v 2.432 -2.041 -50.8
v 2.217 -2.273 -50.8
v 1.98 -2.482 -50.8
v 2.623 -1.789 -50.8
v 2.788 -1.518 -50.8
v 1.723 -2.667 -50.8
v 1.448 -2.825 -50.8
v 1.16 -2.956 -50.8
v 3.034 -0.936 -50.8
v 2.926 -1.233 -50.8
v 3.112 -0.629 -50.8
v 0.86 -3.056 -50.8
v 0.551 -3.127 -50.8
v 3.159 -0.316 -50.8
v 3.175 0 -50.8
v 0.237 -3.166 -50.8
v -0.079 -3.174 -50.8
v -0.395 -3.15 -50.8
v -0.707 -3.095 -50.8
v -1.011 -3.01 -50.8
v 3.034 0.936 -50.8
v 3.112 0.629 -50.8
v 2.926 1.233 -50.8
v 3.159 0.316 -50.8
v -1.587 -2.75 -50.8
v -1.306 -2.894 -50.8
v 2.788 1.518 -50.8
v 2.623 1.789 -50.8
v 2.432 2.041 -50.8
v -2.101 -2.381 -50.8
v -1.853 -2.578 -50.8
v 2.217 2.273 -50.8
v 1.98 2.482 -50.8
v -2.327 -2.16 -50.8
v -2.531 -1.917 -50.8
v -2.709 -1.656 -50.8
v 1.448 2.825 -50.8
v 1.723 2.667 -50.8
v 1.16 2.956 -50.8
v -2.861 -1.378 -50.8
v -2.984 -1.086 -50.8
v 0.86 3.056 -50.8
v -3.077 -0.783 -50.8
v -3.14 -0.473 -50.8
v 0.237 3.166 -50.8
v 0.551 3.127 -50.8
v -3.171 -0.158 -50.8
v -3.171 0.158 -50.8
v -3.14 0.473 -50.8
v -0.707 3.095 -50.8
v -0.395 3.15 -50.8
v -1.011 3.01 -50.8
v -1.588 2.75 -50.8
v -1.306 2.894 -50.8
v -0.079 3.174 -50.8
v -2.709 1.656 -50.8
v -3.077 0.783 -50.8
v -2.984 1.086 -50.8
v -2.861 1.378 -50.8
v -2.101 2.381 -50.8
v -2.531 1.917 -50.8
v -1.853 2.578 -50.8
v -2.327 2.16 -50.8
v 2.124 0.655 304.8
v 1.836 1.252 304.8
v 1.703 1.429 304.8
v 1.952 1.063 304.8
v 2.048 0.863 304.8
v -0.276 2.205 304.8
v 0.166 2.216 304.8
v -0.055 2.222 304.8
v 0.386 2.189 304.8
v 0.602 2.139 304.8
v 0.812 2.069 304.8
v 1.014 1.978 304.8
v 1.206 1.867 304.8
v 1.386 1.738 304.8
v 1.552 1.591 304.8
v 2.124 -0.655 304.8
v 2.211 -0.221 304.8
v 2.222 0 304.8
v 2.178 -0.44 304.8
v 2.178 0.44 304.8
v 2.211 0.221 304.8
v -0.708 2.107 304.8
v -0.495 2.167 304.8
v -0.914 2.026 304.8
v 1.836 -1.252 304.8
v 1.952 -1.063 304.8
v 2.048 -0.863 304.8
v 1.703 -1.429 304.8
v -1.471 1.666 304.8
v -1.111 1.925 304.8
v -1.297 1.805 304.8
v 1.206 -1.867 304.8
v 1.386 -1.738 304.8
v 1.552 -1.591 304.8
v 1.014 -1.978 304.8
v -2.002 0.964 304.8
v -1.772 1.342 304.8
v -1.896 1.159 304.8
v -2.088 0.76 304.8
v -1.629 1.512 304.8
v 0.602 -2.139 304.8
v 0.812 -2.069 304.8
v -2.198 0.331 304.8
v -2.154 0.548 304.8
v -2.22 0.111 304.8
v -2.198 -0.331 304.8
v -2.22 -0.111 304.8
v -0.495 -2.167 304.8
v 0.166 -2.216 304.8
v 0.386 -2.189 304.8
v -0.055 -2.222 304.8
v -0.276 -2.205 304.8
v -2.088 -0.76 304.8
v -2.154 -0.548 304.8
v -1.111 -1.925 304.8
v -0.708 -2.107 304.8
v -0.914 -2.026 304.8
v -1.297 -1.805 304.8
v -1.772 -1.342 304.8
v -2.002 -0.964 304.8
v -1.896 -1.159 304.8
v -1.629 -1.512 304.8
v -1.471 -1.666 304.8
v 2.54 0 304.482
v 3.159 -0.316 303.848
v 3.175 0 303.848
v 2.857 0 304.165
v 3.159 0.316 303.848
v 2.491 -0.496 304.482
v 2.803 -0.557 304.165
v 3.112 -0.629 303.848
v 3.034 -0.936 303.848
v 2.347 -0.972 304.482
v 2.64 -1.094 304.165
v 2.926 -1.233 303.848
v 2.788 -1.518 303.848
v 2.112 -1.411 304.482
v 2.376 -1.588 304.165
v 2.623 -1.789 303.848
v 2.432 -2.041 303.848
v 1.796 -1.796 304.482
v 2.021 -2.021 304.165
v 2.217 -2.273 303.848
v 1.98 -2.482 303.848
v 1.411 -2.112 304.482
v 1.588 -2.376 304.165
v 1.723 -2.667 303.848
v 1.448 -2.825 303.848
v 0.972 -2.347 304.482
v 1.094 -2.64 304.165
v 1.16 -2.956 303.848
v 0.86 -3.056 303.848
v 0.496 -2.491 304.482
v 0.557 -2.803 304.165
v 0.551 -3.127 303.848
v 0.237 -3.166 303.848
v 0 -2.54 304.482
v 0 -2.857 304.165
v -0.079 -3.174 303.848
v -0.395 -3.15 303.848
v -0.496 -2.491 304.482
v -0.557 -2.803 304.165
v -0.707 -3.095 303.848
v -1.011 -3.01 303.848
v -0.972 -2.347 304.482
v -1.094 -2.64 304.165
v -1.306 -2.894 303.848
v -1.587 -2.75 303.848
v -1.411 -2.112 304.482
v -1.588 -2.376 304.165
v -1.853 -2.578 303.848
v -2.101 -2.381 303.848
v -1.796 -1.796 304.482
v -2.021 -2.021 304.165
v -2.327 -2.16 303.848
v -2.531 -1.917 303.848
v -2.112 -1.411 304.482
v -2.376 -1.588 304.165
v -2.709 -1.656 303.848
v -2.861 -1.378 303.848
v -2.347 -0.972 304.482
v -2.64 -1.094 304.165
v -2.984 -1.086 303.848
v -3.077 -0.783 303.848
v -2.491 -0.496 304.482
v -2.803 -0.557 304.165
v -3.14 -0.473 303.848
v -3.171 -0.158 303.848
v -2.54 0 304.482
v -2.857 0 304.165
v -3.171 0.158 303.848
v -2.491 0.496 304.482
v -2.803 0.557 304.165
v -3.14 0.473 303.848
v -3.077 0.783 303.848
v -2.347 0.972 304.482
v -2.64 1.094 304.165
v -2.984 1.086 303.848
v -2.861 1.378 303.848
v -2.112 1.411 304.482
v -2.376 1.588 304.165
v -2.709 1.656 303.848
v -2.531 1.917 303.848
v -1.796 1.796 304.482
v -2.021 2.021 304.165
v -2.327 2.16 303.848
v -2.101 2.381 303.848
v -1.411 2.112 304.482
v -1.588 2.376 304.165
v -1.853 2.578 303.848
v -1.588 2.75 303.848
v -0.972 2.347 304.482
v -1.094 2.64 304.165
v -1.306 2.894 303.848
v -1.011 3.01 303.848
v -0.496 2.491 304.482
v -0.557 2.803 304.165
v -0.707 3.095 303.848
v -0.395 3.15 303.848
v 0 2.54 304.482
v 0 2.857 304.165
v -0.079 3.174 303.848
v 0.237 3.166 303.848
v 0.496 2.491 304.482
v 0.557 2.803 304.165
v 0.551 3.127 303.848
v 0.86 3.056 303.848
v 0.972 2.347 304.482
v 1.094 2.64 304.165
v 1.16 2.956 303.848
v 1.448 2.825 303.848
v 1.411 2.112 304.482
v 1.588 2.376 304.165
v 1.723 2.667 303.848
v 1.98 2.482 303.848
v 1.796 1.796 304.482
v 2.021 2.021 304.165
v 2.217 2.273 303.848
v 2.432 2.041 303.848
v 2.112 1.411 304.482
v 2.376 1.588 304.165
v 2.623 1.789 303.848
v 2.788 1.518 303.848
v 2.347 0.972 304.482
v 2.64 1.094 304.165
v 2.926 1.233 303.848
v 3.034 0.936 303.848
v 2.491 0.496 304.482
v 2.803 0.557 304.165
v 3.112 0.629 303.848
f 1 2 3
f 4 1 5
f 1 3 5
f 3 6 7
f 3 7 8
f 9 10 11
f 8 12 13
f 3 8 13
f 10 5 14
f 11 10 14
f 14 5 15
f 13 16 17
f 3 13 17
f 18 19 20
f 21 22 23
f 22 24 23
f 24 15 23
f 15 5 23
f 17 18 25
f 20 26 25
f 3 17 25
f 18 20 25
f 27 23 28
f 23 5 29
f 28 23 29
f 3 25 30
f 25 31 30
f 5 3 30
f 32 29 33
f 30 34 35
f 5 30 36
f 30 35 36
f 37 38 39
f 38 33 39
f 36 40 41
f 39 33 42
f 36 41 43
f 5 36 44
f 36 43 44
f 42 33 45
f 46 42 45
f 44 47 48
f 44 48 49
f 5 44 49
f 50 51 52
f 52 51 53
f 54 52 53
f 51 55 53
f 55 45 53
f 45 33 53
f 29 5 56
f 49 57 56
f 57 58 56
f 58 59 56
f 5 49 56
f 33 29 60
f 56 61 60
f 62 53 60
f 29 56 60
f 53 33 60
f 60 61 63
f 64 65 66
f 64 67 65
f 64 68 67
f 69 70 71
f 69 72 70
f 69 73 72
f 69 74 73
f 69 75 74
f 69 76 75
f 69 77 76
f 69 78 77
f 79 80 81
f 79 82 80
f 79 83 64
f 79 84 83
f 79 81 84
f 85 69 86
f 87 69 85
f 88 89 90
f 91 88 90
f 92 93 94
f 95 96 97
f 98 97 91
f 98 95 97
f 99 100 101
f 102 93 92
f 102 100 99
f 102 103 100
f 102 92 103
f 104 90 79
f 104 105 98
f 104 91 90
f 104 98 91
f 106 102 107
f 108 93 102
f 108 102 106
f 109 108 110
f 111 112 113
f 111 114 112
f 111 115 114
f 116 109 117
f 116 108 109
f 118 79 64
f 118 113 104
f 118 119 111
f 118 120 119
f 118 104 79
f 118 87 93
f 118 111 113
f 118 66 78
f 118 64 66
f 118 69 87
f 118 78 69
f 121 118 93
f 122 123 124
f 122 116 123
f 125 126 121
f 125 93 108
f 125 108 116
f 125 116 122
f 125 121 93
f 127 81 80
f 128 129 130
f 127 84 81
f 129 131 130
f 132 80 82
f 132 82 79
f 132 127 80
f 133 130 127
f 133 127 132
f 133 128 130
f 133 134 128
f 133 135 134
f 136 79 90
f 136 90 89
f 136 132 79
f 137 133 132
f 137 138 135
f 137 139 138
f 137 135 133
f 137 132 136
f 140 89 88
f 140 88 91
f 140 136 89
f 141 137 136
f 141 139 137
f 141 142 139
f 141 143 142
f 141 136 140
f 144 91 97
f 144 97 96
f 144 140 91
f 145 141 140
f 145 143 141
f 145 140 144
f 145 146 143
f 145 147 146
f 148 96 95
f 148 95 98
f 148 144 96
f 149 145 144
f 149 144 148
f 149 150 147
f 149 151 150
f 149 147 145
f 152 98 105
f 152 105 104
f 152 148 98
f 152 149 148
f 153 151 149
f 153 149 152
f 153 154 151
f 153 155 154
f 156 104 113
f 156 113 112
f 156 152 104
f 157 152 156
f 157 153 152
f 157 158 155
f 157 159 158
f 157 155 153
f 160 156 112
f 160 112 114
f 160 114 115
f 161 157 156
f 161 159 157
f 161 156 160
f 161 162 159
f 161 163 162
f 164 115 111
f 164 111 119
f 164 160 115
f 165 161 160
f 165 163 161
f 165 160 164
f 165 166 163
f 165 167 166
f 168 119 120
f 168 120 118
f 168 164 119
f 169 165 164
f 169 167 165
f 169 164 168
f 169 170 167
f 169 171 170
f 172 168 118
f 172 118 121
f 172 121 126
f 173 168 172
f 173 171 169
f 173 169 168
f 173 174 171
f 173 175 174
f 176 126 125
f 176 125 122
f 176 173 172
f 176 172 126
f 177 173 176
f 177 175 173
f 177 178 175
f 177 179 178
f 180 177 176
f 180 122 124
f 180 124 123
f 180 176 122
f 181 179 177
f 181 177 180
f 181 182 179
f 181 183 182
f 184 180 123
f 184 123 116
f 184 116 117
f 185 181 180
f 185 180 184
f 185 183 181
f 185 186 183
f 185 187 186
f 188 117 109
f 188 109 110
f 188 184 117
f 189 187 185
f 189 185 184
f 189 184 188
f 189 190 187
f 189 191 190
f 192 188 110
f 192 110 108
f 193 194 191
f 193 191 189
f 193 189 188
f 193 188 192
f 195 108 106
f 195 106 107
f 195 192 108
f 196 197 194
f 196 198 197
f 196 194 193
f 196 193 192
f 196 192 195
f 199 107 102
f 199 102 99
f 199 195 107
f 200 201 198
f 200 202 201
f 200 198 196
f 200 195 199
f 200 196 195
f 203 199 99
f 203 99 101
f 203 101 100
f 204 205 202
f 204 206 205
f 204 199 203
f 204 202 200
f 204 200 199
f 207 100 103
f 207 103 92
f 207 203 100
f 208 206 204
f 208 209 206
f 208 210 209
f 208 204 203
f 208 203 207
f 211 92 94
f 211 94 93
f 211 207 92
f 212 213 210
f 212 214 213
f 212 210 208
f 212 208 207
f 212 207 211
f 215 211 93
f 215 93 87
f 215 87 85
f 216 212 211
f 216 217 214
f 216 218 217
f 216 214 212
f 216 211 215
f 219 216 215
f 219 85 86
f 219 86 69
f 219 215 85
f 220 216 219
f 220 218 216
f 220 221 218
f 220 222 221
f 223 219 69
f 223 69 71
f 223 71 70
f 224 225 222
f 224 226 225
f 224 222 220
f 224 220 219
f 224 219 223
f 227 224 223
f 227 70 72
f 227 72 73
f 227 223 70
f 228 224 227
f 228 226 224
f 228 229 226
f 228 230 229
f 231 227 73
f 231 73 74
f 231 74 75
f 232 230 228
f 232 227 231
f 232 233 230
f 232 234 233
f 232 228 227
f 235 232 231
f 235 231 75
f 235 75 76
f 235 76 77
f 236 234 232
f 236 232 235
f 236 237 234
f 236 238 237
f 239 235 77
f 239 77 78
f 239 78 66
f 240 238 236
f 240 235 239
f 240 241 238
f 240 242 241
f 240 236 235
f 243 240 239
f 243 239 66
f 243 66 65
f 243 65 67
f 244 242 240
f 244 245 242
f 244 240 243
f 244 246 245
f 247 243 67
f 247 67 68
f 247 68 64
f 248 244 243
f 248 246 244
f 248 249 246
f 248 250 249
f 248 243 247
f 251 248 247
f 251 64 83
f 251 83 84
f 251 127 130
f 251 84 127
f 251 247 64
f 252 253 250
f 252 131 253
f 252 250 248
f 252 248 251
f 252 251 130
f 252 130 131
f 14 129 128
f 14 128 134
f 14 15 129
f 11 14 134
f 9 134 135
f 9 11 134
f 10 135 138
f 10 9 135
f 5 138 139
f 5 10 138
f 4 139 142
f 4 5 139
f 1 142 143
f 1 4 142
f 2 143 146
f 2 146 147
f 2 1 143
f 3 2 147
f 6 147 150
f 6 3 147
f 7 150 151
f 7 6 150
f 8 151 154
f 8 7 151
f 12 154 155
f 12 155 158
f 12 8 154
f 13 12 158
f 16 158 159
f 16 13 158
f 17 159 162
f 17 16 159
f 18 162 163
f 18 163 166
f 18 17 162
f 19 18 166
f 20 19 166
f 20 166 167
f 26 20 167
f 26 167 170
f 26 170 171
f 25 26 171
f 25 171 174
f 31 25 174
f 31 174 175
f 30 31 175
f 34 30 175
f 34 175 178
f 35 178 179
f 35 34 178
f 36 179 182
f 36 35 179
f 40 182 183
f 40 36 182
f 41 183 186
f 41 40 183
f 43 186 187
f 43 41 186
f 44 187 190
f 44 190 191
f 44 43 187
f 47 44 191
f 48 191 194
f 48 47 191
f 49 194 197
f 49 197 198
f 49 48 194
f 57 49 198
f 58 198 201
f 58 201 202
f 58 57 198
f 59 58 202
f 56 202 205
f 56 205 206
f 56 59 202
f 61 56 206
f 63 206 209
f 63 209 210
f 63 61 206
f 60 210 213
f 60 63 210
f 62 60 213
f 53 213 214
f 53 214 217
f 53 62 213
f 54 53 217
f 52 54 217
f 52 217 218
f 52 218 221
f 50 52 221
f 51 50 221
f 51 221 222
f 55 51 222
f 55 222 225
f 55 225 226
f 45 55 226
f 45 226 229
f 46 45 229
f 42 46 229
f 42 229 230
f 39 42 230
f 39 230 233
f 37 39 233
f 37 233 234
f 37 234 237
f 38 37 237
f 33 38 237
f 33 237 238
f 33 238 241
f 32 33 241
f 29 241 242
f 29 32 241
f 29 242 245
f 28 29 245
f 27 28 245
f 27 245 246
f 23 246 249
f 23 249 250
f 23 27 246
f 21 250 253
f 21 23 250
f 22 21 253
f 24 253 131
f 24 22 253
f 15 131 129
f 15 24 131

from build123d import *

# Parameters (mm, degrees)
SKETCH2_W               = 609.6
SKETCH2_H               = 3.175
CHAMFER1_SIZE           = 0.9525
CUT_EXTRUDE1_DEPTH      = 305.833071123
CUT_EXTRUDE1_DEPTH_BACK = 305.833071123
SKETCH5_W               = 254
SKETCH5_H               = 50.8


with BuildPart() as part:
    # Sketch2 → Revolve1 (revolve)
    with BuildSketch(Plane(origin=(0, 0, 0), x_dir=(0, 0, -1), z_dir=(1, 0, 0))):
        with Locations((0, 1.5875)):
            Rectangle(SKETCH2_W, SKETCH2_H)
    revolve(axis=Axis((0, 0, 304.8), (0, 0, -1)))

    # Chamfer1
    chamfer1_edges = [part.edges().sort_by_distance(p)[0] for p in [
        (0, -3.175, -304.8),
        (0, -3.175, 304.8),
    ]]
    chamfer(chamfer1_edges, length=CHAMFER1_SIZE)

    # Sketch5 → Cut-Extrude1 (cut, two sides: drawn at the far end of the back side and taken through both)
    with BuildSketch(Plane(origin=(0, 0, 0), x_dir=(0, 0, -1), z_dir=(1, 0, 0)).offset(-CUT_EXTRUDE1_DEPTH_BACK)):
        with Locations((177.8, 0)):
            Rectangle(SKETCH5_W, SKETCH5_H)
    extrude(amount=CUT_EXTRUDE1_DEPTH + CUT_EXTRUDE1_DEPTH_BACK, mode=Mode.SUBTRACT)


solid = part.part
